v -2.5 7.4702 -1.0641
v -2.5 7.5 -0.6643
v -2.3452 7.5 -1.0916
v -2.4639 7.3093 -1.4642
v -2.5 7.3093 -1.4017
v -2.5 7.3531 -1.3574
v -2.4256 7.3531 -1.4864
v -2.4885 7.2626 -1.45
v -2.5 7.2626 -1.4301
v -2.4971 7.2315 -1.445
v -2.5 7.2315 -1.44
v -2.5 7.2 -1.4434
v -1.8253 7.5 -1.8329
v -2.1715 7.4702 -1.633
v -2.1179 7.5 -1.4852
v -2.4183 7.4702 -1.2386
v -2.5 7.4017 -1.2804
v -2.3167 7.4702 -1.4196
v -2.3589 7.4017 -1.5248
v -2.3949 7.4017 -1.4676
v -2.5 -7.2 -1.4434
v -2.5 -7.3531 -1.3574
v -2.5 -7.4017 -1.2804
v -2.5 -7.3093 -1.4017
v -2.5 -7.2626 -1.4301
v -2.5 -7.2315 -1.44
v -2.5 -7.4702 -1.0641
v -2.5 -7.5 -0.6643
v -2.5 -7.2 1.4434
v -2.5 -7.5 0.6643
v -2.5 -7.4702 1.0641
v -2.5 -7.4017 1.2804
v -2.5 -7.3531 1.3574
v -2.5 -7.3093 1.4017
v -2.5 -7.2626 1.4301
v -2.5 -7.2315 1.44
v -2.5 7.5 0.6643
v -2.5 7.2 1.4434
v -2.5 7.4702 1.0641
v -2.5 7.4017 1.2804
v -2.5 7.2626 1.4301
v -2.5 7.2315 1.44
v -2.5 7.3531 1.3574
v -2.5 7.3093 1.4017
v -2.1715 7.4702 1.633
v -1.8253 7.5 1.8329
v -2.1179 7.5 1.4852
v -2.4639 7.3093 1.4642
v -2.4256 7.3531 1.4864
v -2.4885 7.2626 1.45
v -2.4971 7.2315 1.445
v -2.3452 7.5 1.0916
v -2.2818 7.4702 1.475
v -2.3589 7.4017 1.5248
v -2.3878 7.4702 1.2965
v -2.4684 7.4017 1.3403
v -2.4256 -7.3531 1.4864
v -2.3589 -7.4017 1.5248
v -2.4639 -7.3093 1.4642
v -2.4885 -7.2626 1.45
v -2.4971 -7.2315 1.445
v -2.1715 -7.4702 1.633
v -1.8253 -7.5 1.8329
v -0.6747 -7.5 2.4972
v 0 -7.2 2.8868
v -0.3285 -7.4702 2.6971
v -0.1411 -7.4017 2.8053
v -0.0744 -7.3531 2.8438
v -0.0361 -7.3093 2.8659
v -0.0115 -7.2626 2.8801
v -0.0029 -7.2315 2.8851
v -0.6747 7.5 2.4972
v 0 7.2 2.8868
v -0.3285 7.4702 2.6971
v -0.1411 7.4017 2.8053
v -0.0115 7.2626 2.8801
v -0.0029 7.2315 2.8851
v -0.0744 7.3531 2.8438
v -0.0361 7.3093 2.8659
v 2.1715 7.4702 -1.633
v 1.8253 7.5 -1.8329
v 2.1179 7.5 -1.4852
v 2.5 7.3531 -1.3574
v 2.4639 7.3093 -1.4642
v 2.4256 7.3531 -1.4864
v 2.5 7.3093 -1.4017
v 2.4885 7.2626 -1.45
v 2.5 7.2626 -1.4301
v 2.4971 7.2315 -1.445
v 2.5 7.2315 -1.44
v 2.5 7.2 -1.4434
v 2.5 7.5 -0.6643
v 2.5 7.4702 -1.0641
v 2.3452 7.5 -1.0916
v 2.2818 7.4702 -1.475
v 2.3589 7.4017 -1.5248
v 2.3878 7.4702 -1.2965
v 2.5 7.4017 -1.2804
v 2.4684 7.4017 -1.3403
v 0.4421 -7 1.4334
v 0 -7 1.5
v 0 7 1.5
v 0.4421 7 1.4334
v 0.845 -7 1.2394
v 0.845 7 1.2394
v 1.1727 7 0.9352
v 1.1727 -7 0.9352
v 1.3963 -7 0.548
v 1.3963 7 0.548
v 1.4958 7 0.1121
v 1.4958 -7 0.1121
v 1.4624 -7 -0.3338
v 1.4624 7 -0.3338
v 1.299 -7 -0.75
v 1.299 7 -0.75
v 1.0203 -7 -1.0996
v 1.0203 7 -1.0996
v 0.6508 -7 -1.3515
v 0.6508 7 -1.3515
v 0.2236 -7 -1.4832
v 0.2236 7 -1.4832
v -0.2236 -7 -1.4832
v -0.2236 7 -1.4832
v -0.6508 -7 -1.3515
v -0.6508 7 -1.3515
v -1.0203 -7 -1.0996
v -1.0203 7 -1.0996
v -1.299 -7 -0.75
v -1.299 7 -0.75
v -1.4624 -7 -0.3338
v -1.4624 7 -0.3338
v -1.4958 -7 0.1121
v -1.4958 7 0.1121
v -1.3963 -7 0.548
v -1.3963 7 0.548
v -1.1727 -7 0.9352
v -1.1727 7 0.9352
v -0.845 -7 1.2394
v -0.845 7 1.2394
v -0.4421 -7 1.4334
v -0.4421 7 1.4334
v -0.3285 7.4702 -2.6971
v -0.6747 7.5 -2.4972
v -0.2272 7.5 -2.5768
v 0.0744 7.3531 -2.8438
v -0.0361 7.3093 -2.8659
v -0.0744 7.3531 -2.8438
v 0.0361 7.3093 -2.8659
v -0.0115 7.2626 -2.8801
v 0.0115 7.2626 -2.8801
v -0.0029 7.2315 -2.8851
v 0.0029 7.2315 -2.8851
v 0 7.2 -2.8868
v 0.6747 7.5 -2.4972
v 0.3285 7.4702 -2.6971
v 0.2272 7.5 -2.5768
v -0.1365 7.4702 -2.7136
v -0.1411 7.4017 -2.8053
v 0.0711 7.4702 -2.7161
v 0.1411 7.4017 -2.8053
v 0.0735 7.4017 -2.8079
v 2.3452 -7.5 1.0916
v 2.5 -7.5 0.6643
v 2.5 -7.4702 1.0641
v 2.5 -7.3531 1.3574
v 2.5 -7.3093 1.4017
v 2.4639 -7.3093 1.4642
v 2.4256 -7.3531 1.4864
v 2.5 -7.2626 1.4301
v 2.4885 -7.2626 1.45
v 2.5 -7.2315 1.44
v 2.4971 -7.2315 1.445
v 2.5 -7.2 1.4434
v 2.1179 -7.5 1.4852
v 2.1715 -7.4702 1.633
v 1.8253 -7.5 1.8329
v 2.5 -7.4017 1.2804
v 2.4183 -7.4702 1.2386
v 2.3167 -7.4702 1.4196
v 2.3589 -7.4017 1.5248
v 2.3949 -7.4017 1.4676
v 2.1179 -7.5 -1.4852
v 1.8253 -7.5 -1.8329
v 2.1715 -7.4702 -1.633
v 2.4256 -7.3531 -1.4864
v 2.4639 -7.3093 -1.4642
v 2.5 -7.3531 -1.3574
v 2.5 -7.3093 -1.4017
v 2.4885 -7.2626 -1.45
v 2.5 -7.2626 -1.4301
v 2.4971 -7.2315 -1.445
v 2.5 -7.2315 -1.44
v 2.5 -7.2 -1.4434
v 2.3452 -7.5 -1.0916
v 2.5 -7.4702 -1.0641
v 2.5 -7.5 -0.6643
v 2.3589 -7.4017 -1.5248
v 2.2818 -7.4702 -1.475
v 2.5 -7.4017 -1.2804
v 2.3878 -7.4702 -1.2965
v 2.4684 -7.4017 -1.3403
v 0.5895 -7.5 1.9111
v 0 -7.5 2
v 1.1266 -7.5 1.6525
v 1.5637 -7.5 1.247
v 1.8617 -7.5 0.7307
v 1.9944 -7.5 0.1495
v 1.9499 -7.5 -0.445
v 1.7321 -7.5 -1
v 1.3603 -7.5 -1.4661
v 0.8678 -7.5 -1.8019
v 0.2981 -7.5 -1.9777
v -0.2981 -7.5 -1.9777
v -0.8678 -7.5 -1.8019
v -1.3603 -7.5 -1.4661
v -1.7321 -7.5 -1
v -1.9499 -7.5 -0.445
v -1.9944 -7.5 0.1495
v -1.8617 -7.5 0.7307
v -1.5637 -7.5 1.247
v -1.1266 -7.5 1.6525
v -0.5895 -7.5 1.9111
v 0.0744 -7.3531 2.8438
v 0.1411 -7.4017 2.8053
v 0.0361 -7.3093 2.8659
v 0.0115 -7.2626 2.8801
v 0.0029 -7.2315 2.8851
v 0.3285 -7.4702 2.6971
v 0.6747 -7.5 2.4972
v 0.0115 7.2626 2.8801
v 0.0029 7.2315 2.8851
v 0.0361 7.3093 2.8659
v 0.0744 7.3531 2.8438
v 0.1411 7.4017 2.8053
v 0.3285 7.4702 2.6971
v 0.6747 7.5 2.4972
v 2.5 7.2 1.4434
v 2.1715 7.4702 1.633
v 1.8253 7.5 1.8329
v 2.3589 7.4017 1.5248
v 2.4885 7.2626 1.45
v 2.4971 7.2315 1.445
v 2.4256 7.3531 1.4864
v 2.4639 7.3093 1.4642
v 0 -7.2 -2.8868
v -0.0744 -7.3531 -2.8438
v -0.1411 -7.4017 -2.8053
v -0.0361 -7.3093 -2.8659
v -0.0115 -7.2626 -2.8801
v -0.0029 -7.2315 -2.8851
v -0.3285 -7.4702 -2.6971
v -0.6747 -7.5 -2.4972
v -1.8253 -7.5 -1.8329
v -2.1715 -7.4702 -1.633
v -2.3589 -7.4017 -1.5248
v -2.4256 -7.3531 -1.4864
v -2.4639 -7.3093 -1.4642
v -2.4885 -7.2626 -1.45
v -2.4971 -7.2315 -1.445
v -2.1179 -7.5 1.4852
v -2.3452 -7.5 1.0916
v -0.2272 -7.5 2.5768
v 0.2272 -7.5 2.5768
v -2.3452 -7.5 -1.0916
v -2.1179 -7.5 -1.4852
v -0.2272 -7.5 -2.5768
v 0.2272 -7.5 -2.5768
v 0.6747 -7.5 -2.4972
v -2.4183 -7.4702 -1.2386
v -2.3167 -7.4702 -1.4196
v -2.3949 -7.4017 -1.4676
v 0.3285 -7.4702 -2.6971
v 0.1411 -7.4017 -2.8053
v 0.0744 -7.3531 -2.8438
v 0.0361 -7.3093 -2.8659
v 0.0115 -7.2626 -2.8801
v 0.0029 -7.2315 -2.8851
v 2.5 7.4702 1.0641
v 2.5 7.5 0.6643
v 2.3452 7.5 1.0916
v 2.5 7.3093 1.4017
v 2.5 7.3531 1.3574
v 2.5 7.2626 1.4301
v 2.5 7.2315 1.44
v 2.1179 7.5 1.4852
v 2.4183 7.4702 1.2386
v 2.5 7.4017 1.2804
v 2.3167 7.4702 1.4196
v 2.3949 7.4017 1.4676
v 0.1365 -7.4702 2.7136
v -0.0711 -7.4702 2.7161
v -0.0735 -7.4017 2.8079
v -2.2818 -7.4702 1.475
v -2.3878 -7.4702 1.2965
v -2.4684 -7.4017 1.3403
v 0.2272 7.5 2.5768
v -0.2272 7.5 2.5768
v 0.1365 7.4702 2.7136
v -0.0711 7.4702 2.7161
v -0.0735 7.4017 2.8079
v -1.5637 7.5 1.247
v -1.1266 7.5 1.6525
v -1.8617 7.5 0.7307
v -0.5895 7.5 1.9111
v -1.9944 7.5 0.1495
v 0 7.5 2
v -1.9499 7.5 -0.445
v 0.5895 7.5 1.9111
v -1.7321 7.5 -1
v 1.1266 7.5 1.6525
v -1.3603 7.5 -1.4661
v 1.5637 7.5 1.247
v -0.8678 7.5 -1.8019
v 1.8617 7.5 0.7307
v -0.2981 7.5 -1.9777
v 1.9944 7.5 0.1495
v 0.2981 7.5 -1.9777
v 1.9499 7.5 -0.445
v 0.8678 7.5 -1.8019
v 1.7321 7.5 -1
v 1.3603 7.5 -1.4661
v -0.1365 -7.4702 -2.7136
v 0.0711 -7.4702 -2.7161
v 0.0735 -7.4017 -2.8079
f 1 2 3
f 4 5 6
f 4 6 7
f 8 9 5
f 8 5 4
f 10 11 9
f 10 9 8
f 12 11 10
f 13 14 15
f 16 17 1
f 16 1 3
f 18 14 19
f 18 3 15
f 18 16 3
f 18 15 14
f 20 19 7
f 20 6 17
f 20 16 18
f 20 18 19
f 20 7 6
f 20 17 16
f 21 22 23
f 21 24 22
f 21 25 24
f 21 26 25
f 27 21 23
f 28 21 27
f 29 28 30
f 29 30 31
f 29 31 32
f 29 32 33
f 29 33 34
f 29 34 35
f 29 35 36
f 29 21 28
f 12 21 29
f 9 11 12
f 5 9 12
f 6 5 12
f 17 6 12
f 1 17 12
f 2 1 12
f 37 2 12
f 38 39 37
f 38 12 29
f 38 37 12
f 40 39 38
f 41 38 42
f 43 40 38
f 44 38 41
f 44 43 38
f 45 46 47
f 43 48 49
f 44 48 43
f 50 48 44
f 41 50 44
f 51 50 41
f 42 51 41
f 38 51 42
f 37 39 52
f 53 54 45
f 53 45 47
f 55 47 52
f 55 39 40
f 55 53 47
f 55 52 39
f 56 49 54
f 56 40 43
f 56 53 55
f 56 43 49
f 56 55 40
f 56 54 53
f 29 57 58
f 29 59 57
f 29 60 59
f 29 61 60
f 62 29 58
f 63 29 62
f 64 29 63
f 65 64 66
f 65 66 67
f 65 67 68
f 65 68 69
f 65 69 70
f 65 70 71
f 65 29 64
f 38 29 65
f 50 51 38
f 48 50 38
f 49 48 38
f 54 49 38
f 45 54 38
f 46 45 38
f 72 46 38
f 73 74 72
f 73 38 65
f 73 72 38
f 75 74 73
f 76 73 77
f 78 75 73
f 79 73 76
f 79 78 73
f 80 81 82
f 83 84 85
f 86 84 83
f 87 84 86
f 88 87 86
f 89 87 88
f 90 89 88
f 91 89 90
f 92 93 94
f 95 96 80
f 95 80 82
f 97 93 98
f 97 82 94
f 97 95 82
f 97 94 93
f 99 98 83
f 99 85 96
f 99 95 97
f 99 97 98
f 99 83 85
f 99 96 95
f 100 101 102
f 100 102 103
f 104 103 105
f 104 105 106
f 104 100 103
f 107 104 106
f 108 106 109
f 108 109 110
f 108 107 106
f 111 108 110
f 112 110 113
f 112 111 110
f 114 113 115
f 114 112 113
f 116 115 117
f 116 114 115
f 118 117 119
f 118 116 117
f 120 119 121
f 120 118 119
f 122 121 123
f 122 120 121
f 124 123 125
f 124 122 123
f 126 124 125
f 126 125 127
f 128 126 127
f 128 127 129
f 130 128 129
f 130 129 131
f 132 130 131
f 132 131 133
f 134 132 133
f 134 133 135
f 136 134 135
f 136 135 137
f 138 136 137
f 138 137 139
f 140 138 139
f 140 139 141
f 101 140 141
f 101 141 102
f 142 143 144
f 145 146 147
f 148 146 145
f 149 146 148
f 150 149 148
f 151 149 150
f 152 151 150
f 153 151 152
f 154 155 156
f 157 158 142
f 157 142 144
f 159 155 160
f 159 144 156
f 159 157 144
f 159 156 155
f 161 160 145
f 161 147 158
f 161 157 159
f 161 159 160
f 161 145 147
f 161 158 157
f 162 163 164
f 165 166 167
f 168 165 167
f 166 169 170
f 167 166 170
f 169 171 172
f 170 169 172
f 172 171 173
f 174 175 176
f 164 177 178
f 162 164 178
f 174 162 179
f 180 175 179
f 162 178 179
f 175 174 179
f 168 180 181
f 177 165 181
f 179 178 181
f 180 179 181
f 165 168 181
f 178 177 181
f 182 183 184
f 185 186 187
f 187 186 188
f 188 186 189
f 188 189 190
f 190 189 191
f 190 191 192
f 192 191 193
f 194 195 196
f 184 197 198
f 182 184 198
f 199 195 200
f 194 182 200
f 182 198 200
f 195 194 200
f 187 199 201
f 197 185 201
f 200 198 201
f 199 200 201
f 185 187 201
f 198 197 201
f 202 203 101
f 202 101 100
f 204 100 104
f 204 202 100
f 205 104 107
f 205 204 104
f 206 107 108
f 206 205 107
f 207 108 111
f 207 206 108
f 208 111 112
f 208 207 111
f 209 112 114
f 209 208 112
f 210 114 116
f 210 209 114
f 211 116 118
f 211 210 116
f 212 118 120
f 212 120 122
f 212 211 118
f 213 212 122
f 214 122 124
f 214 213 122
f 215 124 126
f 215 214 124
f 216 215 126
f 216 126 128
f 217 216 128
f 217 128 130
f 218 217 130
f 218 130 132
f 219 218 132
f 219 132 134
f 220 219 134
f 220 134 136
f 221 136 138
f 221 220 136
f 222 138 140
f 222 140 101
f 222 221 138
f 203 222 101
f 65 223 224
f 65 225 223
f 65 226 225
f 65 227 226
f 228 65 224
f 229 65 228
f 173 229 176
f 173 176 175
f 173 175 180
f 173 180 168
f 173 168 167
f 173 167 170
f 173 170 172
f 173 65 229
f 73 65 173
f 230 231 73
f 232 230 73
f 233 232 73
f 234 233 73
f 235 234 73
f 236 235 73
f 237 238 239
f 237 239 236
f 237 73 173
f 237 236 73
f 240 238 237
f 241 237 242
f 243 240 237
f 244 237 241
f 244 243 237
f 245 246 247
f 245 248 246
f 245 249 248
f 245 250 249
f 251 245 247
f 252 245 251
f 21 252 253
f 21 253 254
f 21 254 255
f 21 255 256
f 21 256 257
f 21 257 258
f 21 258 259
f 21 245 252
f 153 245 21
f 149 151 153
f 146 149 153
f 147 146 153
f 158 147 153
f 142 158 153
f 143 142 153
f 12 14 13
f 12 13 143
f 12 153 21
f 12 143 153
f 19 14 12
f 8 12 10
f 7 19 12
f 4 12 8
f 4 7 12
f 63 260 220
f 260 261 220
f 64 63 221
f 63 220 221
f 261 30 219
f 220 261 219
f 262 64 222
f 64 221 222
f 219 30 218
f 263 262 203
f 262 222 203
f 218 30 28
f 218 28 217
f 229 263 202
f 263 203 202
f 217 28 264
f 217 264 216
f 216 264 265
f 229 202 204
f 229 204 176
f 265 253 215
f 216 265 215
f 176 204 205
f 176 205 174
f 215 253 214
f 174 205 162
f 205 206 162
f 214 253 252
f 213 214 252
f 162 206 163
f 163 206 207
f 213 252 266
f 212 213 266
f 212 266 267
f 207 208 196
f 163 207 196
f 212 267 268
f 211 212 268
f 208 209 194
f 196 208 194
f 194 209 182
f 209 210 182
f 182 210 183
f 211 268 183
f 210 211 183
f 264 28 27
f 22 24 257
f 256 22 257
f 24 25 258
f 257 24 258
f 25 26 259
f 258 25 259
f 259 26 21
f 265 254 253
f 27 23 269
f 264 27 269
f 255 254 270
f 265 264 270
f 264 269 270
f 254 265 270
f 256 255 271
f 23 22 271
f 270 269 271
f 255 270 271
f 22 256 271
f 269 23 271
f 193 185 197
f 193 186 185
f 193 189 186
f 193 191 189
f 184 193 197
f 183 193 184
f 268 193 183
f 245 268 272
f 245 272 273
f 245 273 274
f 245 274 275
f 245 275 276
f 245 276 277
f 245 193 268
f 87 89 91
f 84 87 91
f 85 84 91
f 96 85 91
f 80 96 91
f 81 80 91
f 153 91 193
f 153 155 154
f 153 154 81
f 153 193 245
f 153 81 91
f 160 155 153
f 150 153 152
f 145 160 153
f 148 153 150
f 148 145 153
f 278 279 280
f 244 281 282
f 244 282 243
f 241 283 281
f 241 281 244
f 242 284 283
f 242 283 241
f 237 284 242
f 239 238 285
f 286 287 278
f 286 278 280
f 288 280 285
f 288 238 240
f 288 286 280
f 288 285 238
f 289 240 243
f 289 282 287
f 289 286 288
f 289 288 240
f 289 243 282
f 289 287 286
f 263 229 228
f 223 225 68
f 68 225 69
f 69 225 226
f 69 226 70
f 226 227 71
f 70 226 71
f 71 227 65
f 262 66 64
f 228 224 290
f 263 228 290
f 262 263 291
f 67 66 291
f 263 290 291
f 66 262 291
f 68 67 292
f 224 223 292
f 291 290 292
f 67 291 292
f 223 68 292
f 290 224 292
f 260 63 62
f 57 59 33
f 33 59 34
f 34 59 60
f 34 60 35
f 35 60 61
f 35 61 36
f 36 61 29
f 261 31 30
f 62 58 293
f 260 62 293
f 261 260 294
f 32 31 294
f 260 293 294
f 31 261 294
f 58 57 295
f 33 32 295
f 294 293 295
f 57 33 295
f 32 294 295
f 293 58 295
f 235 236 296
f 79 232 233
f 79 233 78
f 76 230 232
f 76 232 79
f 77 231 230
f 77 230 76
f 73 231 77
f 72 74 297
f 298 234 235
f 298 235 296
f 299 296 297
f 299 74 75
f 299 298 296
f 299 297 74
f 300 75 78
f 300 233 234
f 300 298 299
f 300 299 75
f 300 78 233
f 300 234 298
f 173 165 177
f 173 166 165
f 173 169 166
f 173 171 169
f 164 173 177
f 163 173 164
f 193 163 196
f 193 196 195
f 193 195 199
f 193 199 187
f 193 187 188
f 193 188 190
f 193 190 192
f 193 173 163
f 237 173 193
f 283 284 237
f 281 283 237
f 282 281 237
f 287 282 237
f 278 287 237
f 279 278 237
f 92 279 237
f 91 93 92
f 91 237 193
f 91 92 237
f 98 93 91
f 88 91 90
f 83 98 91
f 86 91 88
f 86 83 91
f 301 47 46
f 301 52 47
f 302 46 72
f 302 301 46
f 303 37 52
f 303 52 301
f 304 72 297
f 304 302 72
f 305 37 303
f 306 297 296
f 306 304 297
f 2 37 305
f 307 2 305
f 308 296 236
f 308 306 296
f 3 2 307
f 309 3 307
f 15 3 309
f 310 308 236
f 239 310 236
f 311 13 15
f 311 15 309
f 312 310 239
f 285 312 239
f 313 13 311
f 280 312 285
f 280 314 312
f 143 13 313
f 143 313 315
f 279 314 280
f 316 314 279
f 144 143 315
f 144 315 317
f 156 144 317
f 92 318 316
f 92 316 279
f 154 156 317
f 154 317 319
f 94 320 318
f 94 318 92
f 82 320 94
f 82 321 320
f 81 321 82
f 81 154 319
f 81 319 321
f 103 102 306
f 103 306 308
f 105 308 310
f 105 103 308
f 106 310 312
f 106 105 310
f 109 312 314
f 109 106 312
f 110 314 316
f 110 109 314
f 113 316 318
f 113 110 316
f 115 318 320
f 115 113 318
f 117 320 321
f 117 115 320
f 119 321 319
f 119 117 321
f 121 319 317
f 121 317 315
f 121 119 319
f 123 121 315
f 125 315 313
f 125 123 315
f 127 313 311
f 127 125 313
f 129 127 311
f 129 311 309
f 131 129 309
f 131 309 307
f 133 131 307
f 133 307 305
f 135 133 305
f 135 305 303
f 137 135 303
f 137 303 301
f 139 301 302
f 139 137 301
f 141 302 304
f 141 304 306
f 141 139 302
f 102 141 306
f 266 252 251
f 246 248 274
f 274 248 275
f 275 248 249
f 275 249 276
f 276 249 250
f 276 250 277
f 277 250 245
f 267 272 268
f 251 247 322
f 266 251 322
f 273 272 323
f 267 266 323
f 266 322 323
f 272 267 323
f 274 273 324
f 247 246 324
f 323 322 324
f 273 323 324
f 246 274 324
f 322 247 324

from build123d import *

# Parameters (mm, degrees)
SKETCH2_R           = 1.5
BOSS_EXTRUDE2_DEPTH = 7.5
CHAMFER1_SIZE       = 0.5


with BuildPart() as part:
    # Sketch2 → Boss-Extrude2 (new, symmetric)
    with BuildSketch(Plane(origin=(0, 0, 0), x_dir=(1, 0, 0), z_dir=(0, 1, 0))):
        Polygon((0, -2.886751346), (2.5, -1.443375673), (2.5, 1.443375673), (0, 2.886751346), (-2.5, 1.443375673), (-2.5, -1.443375673), align=None)
        with Locations(Location((0, 0, 0), (0, 0, 270))):
            Circle(SKETCH2_R, mode=Mode.SUBTRACT)
    extrude(amount=BOSS_EXTRUDE2_DEPTH, both=True)

    # Chamfer1
    chamfer1_edges = [part.edges().sort_by_distance(p)[0] for p in [
        (0, -7.5, -1.5),
        (0, 7.5, -1.5),
    ]]
    chamfer(chamfer1_edges, length=CHAMFER1_SIZE)

    # Sketch4 → Cut-Revolve1 (revolve, cut)
    with BuildSketch(Plane(origin=(0, 0, 0), x_dir=(0, 0, -1), z_dir=(1, 0, 0))):
        with BuildLine():
            Line((-2.886751346, 7.2), (-2.886751346, 7.5))
            Line((-2.886751346, 7.5), (-2.586751346, 7.5))
            ThreePointArc((-2.586751346, 7.5), (-2.79888338, 7.412132034), (-2.886751346, 7.2))
        make_face()
    cut_revolve1 = revolve(axis=Axis((0, 57.75, 0), (0, -1, 0)), mode=Mode.SUBTRACT)

    # Mirror1: Cut-Revolve1 across plane
    add(cut_revolve1.mirror(Plane.ZX), mode=Mode.SUBTRACT)


solid = part.part
